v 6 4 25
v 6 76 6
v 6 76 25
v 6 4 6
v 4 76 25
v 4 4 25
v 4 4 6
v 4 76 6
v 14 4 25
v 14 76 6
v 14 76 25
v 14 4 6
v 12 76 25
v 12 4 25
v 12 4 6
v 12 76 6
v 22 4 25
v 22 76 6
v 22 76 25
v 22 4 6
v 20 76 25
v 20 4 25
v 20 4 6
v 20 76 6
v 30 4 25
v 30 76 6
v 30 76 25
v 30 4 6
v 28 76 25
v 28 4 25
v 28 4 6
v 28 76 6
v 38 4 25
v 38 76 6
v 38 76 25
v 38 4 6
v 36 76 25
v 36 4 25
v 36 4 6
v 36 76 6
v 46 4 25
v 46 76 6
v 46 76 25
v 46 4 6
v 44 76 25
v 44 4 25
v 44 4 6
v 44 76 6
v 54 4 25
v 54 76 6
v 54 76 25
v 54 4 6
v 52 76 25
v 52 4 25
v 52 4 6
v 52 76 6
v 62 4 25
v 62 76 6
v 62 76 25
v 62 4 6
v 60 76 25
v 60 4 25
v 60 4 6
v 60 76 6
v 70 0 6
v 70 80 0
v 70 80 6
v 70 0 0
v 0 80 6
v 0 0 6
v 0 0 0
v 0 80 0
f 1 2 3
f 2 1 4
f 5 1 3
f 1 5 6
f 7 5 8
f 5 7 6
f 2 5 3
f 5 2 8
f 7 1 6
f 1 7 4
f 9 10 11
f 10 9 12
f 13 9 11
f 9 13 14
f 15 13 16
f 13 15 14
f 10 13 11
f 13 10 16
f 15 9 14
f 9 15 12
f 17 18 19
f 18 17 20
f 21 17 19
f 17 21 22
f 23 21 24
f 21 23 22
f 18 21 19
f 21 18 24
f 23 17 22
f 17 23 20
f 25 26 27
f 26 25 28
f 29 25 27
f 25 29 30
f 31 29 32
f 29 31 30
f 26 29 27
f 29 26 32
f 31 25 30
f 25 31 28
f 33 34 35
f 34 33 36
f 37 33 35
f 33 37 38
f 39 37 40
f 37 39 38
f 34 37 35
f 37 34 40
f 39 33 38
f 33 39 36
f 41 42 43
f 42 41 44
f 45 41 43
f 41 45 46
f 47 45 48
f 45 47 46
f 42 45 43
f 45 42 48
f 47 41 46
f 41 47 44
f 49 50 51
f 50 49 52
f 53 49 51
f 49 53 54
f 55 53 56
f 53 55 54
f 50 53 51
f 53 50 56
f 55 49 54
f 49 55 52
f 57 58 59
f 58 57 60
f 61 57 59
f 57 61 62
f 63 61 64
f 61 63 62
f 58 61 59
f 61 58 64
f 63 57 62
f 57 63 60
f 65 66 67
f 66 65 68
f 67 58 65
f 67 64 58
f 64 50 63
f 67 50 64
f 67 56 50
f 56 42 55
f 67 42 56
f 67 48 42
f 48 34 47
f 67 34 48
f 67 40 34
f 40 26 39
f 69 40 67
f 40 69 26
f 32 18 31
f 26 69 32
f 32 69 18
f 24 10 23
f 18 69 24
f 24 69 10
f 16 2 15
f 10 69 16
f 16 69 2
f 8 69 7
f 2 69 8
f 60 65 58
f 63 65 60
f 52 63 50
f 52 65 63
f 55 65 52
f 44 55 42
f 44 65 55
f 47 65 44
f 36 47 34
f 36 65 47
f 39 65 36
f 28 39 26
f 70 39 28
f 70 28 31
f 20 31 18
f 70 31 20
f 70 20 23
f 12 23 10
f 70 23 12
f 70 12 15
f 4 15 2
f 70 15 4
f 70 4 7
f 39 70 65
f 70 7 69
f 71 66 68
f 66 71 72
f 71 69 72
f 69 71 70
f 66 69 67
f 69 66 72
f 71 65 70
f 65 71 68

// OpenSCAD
$fn = 32;

// ----------------------------------------------------------------------
// Heatsink: uniform fin block
// ----------------------------------------------------------------------

// --- parameters (mm) ---
base_l = 70;              // base length, X
base_w = 80;              // base width, Y
base_t = 6;               // base plate thickness
fin_h = 20;               // fin height above the base
fin_t = 2;                // fin thickness
edge = 4;                 // margin from the base ends
pitch = 8;                // fin pitch
fit_tol = 0.05;           // tolerance for press fits, mm
free_tol = 0.2;           // tolerance for clearance fits, mm

n_fins = floor((base_l - 2 * edge - fin_t) / pitch) + 1;  // fin count
total_h = base_t + fin_h - 1;  // overall height

union() {
  cube([base_l, base_w, base_t]);
  for (i = [0 : n_fins - 1])
    translate([edge + i * pitch, edge, base_t - 1])
      cube([fin_t, base_w - 2 * edge, fin_h]);
}
